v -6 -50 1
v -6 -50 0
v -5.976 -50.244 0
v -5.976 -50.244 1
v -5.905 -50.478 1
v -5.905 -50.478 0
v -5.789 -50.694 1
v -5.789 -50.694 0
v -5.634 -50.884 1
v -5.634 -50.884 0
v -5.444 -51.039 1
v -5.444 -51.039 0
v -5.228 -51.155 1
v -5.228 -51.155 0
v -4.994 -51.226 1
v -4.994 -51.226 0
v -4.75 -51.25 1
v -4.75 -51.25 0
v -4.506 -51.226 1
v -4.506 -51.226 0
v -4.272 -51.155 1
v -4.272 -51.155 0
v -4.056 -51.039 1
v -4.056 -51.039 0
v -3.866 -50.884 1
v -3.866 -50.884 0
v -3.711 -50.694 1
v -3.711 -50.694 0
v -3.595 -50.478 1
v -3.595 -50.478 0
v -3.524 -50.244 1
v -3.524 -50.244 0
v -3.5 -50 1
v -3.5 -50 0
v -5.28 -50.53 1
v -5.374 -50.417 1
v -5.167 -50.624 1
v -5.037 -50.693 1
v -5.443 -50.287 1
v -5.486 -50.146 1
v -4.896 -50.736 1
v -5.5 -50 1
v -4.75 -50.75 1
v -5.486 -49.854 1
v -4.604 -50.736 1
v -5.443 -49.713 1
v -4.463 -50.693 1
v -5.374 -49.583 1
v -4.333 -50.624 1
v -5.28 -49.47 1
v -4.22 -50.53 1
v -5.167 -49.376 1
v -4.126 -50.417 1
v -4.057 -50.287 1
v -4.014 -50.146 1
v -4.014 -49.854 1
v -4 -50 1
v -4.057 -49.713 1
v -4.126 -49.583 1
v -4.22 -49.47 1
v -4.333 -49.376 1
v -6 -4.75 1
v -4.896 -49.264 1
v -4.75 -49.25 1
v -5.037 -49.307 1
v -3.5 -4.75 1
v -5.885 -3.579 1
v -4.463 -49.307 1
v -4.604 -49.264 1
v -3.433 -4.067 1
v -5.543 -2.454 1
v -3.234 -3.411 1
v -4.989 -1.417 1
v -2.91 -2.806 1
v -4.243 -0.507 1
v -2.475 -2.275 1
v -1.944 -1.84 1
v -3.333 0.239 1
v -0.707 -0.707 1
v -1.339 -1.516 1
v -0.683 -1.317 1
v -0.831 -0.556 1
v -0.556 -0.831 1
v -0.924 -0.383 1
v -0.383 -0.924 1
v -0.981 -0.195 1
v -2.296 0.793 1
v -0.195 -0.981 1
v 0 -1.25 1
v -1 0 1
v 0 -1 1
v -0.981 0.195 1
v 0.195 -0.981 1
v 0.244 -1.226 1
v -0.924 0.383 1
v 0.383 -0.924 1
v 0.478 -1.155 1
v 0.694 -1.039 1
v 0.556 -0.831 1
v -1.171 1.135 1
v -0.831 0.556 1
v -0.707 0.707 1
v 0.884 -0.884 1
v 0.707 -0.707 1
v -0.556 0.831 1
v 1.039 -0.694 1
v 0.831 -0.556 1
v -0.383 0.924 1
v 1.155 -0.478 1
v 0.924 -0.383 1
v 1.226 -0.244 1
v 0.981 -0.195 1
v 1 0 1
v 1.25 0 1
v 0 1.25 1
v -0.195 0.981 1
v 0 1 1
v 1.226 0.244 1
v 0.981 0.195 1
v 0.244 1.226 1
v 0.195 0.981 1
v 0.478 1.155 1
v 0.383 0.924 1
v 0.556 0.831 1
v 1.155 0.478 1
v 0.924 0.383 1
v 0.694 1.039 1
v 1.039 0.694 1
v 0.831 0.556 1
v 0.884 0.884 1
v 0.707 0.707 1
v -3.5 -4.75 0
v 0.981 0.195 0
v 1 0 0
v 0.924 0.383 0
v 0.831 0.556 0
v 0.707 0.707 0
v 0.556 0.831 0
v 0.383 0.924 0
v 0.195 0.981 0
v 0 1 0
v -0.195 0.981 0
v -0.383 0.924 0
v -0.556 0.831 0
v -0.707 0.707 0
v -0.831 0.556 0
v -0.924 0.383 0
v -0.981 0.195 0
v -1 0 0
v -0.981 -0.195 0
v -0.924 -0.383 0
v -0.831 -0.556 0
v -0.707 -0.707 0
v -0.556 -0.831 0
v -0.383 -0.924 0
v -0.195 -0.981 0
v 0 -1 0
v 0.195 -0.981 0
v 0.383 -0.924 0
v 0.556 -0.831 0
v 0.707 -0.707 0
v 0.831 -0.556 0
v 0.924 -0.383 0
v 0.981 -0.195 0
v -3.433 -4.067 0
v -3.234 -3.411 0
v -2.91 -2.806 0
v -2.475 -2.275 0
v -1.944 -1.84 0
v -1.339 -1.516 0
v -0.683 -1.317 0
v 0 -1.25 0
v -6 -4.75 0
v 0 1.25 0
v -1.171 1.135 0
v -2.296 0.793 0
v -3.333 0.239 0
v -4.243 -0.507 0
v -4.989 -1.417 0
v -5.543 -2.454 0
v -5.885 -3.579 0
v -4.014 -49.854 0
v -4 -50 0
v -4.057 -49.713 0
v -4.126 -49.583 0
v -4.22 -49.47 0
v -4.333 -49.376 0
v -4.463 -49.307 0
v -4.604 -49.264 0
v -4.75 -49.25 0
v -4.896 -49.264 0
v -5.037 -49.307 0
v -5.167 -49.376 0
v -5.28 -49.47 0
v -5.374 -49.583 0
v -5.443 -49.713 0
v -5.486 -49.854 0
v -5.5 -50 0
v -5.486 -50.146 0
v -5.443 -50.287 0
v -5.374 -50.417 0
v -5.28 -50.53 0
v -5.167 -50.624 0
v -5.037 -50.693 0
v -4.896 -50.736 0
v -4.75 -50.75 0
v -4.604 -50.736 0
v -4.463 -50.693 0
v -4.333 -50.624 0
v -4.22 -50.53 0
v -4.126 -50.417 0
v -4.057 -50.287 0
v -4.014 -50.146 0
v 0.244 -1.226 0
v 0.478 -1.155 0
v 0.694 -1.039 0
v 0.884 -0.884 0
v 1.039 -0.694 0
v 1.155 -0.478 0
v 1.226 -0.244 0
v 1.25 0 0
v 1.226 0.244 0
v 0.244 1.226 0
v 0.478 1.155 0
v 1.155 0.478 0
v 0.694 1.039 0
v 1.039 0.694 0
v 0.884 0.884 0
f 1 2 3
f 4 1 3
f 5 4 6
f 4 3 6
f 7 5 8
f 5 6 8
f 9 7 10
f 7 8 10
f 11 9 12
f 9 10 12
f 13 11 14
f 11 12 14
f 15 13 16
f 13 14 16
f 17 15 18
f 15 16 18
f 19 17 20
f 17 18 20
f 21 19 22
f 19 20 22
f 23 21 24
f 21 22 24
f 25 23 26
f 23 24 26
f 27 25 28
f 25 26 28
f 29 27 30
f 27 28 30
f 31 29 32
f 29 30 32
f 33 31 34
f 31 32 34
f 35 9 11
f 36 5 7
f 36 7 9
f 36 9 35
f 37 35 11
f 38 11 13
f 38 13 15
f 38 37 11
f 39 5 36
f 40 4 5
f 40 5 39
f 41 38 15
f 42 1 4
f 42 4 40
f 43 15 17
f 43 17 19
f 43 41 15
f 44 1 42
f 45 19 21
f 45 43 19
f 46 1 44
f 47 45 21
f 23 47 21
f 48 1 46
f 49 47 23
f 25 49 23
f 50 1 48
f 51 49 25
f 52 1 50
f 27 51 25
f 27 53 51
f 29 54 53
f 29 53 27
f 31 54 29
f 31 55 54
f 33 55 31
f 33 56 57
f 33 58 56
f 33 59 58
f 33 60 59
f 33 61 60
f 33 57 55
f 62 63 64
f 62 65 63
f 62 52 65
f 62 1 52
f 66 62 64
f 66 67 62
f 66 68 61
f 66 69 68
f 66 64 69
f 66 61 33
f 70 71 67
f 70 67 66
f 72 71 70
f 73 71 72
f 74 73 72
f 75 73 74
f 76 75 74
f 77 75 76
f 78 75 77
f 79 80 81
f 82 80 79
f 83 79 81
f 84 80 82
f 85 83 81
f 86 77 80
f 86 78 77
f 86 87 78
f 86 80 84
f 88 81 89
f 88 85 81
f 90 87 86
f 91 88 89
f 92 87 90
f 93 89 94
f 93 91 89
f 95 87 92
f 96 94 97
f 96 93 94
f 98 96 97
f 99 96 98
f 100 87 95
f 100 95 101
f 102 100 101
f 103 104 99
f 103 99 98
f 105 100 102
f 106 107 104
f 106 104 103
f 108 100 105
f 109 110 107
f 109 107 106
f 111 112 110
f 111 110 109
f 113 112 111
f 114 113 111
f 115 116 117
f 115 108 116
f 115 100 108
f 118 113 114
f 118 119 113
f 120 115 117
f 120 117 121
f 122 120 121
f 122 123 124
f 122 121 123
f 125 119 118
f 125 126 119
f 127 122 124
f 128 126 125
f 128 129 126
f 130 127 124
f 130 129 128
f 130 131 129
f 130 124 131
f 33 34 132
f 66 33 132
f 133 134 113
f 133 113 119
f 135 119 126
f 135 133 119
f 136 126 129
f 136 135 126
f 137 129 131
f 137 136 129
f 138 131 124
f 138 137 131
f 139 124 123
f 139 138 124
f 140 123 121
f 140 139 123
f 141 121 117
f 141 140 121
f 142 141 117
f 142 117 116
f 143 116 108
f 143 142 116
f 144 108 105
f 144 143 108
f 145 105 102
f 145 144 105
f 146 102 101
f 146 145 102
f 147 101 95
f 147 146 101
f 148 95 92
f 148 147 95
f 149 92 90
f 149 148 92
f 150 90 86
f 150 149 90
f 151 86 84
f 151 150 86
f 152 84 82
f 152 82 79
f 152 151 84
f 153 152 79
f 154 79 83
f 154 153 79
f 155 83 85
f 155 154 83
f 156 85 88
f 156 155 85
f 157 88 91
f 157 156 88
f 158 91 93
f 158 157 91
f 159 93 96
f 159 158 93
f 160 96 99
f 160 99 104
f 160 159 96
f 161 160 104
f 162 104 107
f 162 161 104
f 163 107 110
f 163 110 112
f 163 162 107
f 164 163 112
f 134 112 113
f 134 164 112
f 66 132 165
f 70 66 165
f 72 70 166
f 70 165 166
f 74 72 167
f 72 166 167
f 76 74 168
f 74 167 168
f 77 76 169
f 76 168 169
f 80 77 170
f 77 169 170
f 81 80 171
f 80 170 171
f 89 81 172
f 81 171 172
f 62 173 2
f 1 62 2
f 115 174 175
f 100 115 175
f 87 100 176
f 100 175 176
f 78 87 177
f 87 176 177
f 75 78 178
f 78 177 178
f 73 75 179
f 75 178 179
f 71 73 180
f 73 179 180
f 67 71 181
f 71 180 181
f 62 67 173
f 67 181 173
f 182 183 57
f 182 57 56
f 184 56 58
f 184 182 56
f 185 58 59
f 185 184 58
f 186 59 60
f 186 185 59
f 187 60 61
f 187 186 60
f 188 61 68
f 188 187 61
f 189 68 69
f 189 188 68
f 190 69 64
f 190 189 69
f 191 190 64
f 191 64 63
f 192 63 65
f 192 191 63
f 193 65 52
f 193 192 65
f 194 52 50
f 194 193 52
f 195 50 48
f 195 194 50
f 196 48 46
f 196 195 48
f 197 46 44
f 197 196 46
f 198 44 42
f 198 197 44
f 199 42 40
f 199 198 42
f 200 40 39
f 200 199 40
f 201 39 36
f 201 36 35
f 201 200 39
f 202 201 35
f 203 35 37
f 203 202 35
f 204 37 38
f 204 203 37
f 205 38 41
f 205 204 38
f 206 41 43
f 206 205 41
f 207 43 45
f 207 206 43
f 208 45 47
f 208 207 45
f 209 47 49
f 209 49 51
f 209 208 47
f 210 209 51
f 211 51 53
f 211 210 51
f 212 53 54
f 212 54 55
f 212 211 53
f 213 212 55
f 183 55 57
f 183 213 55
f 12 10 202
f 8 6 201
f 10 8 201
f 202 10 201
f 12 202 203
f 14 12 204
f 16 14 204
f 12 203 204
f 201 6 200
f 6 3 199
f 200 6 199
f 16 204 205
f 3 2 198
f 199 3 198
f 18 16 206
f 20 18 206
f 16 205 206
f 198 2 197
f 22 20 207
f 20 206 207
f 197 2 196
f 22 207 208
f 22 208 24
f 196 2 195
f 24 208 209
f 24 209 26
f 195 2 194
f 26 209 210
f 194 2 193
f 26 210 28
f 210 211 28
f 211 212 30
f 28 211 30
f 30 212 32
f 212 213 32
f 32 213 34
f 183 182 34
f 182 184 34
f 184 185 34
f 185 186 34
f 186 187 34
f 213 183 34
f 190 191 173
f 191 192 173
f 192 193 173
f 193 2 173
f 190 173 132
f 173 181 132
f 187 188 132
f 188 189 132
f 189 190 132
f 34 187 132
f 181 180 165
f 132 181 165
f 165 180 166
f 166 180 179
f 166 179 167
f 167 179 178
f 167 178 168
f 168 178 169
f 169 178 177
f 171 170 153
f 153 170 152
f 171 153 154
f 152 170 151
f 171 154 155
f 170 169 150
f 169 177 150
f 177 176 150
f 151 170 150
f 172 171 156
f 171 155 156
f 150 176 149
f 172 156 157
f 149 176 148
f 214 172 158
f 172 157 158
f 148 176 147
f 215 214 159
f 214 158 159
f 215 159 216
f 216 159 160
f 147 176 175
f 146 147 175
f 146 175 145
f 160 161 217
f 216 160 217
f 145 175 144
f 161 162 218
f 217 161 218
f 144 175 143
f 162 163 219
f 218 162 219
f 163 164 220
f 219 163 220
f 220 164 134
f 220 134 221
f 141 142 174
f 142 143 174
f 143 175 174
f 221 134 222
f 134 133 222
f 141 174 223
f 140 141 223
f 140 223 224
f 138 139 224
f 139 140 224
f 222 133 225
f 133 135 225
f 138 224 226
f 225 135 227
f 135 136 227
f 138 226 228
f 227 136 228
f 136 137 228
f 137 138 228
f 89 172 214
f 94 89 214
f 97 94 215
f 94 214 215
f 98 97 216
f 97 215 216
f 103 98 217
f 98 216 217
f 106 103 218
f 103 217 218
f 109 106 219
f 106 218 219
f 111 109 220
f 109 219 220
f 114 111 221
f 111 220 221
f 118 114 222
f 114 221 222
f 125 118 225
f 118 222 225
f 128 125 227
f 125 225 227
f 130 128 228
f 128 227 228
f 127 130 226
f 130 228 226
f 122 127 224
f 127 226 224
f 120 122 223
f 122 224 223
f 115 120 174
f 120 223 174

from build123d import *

# Parameters (mm, degrees)
SKETCH2_R           = 1
SKETCH2_R_2         = 0.75
BOSS_EXTRUDE1_DEPTH = 1


with BuildPart() as part:
    # Sketch2 → Boss-Extrude1 (new body)
    with BuildSketch(Plane.XY):
        with BuildLine():
            Line((-6, -4.75), (-6, -50))
            ThreePointArc((-6, -50), (-4.75, -51.25), (-3.5, -50))
            Line((-3.5, -50), (-3.5, -4.75))
            ThreePointArc((-3.5, -4.75), (-2.474873734, -2.275126266), (0, -1.25))
            ThreePointArc((0, -1.25), (1.25, 0), (0, 1.25))
            ThreePointArc((0, 1.25), (-4.242640687, -0.507359313), (-6, -4.75))
        make_face()
        Circle(SKETCH2_R, mode=Mode.SUBTRACT)
        with Locations((-4.75, -50)):
            Circle(SKETCH2_R_2, mode=Mode.SUBTRACT)
    extrude(amount=BOSS_EXTRUDE1_DEPTH)


solid = part.part
